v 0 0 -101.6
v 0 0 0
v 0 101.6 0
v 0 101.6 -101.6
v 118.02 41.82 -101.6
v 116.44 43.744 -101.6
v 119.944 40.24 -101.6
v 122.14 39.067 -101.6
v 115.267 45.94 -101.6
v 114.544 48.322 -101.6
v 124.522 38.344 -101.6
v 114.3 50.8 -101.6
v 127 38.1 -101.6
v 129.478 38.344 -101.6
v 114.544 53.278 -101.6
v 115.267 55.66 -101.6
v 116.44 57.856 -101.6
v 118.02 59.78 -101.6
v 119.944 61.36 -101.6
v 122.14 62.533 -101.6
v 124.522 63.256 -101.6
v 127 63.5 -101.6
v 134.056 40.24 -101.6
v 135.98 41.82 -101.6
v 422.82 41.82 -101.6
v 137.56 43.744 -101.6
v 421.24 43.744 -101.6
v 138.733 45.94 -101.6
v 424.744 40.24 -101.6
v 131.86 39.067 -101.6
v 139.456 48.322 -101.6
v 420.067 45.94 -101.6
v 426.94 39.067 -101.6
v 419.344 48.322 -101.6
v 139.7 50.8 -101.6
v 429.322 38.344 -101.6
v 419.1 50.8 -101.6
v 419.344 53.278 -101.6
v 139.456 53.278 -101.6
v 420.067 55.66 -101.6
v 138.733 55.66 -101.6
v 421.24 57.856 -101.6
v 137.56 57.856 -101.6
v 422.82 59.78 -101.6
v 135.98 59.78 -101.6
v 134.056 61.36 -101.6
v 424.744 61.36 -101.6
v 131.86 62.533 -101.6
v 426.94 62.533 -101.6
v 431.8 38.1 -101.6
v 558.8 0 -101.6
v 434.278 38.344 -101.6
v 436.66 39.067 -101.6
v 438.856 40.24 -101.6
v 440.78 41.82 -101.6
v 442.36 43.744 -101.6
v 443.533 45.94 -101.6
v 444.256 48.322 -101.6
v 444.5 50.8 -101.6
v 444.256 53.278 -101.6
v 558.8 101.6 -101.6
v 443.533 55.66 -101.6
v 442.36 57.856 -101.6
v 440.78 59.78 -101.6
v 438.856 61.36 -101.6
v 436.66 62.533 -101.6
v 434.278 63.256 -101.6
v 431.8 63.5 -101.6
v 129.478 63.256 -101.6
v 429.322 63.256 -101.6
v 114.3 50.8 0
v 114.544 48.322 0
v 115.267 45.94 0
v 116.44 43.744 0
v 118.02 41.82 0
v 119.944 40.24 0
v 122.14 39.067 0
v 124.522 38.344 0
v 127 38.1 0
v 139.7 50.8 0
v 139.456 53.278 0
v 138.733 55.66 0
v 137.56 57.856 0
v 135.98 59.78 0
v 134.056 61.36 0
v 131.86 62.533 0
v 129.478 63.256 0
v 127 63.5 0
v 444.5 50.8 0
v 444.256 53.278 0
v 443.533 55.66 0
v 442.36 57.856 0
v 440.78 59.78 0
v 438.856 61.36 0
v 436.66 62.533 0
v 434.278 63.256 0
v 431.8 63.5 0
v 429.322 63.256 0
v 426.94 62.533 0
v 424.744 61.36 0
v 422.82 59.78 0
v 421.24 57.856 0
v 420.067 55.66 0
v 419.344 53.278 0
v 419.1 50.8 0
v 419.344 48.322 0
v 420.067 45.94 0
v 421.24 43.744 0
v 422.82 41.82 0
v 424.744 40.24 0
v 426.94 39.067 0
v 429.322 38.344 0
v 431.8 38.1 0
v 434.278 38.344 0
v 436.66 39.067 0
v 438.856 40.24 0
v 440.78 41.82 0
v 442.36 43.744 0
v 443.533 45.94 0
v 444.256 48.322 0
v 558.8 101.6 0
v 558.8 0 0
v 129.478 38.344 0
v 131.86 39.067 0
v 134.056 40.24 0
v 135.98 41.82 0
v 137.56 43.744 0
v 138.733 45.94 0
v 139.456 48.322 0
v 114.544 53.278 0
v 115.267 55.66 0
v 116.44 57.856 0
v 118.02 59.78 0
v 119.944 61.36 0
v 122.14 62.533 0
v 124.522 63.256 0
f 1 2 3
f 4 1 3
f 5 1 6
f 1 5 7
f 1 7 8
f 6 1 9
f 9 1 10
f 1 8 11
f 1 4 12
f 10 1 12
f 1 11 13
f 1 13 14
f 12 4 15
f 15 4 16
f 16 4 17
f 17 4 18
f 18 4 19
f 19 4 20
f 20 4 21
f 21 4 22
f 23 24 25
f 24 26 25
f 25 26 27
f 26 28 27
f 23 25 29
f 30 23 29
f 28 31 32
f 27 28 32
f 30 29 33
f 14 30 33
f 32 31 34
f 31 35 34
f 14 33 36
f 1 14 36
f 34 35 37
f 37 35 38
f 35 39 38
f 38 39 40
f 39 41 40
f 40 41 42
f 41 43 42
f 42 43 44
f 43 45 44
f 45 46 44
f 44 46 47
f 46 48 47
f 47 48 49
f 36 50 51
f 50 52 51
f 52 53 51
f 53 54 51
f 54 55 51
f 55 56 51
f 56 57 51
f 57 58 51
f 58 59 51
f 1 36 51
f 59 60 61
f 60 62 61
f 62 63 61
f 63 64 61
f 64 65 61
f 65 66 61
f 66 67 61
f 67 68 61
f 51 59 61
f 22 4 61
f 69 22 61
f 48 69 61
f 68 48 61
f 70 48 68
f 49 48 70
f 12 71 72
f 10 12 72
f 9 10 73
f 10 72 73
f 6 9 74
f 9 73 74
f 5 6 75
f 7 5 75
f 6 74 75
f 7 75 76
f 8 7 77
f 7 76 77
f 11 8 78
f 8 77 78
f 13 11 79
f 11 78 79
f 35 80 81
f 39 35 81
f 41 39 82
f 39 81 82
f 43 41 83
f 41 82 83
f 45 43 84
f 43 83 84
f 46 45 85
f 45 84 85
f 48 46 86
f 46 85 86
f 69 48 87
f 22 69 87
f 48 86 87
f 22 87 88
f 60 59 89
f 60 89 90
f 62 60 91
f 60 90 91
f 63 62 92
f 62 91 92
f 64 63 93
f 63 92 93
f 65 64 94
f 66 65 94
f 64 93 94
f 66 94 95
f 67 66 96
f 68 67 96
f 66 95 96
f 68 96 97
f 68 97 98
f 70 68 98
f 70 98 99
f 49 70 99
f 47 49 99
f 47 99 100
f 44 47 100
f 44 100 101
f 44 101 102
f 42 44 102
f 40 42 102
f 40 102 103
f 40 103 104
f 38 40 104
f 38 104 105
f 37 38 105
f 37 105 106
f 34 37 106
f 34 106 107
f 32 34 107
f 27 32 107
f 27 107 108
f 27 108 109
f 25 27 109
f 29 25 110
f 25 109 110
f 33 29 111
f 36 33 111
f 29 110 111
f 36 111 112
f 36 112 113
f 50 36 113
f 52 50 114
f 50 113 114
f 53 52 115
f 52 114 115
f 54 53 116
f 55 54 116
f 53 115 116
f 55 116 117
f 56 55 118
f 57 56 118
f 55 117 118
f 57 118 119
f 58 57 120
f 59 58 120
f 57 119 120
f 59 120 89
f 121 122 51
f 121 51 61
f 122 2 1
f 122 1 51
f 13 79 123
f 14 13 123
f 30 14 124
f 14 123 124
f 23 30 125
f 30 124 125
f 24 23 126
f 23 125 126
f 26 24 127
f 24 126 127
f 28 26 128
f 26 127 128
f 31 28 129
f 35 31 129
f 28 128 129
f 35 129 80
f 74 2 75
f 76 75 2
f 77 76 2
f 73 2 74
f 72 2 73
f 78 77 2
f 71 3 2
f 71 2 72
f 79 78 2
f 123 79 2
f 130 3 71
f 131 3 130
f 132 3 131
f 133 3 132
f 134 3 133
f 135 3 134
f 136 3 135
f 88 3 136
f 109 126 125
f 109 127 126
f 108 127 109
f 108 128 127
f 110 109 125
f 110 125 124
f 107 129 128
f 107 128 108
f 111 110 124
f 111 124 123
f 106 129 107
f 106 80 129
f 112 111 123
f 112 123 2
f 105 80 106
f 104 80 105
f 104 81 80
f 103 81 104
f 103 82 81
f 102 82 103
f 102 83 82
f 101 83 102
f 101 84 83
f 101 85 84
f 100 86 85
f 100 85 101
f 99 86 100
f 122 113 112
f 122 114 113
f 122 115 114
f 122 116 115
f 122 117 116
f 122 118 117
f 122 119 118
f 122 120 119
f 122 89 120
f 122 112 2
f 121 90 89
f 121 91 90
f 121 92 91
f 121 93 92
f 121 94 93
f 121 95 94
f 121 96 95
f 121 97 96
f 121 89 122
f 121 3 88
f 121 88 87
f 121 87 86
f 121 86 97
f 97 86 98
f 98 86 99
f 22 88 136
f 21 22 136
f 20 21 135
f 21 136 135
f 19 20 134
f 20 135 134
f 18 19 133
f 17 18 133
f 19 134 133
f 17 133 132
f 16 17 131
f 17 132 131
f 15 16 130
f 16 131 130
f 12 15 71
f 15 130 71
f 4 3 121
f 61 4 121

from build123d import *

# Parameters (mm, degrees)
F0_W     = 558.8
F0_H     = 101.6
F1_DEPTH = 101.6
F2_R     = 12.7
F3_DEPTH = 101.601


with BuildPart() as f1:
    # F0 (on Top) → F1 (new body)
    with BuildSketch(Plane.XY):
        with Locations((279.4, 50.8)):
            Rectangle(F0_W, F0_H)
    extrude(amount=-F1_DEPTH)

    # F2 (on face) → F3 (cut, through all)
    with BuildSketch(Plane.XY):
        with BuildLine():
            ThreePointArc((127, 38.1), (135.980256, 41.819744), (139.7, 50.8))
            ThreePointArc((139.7, 50.8), (135.980256, 59.780256), (127, 63.5))
            ThreePointArc((127, 63.5), (118.019744, 59.780256), (114.3, 50.8))
            ThreePointArc((114.3, 50.8), (118.019744, 41.819744), (127, 38.1))
        make_face()
        with Locations((431.8, 50.8)):
            Circle(F2_R)
    extrude(amount=-F3_DEPTH, mode=Mode.SUBTRACT)


solid = f1.part
